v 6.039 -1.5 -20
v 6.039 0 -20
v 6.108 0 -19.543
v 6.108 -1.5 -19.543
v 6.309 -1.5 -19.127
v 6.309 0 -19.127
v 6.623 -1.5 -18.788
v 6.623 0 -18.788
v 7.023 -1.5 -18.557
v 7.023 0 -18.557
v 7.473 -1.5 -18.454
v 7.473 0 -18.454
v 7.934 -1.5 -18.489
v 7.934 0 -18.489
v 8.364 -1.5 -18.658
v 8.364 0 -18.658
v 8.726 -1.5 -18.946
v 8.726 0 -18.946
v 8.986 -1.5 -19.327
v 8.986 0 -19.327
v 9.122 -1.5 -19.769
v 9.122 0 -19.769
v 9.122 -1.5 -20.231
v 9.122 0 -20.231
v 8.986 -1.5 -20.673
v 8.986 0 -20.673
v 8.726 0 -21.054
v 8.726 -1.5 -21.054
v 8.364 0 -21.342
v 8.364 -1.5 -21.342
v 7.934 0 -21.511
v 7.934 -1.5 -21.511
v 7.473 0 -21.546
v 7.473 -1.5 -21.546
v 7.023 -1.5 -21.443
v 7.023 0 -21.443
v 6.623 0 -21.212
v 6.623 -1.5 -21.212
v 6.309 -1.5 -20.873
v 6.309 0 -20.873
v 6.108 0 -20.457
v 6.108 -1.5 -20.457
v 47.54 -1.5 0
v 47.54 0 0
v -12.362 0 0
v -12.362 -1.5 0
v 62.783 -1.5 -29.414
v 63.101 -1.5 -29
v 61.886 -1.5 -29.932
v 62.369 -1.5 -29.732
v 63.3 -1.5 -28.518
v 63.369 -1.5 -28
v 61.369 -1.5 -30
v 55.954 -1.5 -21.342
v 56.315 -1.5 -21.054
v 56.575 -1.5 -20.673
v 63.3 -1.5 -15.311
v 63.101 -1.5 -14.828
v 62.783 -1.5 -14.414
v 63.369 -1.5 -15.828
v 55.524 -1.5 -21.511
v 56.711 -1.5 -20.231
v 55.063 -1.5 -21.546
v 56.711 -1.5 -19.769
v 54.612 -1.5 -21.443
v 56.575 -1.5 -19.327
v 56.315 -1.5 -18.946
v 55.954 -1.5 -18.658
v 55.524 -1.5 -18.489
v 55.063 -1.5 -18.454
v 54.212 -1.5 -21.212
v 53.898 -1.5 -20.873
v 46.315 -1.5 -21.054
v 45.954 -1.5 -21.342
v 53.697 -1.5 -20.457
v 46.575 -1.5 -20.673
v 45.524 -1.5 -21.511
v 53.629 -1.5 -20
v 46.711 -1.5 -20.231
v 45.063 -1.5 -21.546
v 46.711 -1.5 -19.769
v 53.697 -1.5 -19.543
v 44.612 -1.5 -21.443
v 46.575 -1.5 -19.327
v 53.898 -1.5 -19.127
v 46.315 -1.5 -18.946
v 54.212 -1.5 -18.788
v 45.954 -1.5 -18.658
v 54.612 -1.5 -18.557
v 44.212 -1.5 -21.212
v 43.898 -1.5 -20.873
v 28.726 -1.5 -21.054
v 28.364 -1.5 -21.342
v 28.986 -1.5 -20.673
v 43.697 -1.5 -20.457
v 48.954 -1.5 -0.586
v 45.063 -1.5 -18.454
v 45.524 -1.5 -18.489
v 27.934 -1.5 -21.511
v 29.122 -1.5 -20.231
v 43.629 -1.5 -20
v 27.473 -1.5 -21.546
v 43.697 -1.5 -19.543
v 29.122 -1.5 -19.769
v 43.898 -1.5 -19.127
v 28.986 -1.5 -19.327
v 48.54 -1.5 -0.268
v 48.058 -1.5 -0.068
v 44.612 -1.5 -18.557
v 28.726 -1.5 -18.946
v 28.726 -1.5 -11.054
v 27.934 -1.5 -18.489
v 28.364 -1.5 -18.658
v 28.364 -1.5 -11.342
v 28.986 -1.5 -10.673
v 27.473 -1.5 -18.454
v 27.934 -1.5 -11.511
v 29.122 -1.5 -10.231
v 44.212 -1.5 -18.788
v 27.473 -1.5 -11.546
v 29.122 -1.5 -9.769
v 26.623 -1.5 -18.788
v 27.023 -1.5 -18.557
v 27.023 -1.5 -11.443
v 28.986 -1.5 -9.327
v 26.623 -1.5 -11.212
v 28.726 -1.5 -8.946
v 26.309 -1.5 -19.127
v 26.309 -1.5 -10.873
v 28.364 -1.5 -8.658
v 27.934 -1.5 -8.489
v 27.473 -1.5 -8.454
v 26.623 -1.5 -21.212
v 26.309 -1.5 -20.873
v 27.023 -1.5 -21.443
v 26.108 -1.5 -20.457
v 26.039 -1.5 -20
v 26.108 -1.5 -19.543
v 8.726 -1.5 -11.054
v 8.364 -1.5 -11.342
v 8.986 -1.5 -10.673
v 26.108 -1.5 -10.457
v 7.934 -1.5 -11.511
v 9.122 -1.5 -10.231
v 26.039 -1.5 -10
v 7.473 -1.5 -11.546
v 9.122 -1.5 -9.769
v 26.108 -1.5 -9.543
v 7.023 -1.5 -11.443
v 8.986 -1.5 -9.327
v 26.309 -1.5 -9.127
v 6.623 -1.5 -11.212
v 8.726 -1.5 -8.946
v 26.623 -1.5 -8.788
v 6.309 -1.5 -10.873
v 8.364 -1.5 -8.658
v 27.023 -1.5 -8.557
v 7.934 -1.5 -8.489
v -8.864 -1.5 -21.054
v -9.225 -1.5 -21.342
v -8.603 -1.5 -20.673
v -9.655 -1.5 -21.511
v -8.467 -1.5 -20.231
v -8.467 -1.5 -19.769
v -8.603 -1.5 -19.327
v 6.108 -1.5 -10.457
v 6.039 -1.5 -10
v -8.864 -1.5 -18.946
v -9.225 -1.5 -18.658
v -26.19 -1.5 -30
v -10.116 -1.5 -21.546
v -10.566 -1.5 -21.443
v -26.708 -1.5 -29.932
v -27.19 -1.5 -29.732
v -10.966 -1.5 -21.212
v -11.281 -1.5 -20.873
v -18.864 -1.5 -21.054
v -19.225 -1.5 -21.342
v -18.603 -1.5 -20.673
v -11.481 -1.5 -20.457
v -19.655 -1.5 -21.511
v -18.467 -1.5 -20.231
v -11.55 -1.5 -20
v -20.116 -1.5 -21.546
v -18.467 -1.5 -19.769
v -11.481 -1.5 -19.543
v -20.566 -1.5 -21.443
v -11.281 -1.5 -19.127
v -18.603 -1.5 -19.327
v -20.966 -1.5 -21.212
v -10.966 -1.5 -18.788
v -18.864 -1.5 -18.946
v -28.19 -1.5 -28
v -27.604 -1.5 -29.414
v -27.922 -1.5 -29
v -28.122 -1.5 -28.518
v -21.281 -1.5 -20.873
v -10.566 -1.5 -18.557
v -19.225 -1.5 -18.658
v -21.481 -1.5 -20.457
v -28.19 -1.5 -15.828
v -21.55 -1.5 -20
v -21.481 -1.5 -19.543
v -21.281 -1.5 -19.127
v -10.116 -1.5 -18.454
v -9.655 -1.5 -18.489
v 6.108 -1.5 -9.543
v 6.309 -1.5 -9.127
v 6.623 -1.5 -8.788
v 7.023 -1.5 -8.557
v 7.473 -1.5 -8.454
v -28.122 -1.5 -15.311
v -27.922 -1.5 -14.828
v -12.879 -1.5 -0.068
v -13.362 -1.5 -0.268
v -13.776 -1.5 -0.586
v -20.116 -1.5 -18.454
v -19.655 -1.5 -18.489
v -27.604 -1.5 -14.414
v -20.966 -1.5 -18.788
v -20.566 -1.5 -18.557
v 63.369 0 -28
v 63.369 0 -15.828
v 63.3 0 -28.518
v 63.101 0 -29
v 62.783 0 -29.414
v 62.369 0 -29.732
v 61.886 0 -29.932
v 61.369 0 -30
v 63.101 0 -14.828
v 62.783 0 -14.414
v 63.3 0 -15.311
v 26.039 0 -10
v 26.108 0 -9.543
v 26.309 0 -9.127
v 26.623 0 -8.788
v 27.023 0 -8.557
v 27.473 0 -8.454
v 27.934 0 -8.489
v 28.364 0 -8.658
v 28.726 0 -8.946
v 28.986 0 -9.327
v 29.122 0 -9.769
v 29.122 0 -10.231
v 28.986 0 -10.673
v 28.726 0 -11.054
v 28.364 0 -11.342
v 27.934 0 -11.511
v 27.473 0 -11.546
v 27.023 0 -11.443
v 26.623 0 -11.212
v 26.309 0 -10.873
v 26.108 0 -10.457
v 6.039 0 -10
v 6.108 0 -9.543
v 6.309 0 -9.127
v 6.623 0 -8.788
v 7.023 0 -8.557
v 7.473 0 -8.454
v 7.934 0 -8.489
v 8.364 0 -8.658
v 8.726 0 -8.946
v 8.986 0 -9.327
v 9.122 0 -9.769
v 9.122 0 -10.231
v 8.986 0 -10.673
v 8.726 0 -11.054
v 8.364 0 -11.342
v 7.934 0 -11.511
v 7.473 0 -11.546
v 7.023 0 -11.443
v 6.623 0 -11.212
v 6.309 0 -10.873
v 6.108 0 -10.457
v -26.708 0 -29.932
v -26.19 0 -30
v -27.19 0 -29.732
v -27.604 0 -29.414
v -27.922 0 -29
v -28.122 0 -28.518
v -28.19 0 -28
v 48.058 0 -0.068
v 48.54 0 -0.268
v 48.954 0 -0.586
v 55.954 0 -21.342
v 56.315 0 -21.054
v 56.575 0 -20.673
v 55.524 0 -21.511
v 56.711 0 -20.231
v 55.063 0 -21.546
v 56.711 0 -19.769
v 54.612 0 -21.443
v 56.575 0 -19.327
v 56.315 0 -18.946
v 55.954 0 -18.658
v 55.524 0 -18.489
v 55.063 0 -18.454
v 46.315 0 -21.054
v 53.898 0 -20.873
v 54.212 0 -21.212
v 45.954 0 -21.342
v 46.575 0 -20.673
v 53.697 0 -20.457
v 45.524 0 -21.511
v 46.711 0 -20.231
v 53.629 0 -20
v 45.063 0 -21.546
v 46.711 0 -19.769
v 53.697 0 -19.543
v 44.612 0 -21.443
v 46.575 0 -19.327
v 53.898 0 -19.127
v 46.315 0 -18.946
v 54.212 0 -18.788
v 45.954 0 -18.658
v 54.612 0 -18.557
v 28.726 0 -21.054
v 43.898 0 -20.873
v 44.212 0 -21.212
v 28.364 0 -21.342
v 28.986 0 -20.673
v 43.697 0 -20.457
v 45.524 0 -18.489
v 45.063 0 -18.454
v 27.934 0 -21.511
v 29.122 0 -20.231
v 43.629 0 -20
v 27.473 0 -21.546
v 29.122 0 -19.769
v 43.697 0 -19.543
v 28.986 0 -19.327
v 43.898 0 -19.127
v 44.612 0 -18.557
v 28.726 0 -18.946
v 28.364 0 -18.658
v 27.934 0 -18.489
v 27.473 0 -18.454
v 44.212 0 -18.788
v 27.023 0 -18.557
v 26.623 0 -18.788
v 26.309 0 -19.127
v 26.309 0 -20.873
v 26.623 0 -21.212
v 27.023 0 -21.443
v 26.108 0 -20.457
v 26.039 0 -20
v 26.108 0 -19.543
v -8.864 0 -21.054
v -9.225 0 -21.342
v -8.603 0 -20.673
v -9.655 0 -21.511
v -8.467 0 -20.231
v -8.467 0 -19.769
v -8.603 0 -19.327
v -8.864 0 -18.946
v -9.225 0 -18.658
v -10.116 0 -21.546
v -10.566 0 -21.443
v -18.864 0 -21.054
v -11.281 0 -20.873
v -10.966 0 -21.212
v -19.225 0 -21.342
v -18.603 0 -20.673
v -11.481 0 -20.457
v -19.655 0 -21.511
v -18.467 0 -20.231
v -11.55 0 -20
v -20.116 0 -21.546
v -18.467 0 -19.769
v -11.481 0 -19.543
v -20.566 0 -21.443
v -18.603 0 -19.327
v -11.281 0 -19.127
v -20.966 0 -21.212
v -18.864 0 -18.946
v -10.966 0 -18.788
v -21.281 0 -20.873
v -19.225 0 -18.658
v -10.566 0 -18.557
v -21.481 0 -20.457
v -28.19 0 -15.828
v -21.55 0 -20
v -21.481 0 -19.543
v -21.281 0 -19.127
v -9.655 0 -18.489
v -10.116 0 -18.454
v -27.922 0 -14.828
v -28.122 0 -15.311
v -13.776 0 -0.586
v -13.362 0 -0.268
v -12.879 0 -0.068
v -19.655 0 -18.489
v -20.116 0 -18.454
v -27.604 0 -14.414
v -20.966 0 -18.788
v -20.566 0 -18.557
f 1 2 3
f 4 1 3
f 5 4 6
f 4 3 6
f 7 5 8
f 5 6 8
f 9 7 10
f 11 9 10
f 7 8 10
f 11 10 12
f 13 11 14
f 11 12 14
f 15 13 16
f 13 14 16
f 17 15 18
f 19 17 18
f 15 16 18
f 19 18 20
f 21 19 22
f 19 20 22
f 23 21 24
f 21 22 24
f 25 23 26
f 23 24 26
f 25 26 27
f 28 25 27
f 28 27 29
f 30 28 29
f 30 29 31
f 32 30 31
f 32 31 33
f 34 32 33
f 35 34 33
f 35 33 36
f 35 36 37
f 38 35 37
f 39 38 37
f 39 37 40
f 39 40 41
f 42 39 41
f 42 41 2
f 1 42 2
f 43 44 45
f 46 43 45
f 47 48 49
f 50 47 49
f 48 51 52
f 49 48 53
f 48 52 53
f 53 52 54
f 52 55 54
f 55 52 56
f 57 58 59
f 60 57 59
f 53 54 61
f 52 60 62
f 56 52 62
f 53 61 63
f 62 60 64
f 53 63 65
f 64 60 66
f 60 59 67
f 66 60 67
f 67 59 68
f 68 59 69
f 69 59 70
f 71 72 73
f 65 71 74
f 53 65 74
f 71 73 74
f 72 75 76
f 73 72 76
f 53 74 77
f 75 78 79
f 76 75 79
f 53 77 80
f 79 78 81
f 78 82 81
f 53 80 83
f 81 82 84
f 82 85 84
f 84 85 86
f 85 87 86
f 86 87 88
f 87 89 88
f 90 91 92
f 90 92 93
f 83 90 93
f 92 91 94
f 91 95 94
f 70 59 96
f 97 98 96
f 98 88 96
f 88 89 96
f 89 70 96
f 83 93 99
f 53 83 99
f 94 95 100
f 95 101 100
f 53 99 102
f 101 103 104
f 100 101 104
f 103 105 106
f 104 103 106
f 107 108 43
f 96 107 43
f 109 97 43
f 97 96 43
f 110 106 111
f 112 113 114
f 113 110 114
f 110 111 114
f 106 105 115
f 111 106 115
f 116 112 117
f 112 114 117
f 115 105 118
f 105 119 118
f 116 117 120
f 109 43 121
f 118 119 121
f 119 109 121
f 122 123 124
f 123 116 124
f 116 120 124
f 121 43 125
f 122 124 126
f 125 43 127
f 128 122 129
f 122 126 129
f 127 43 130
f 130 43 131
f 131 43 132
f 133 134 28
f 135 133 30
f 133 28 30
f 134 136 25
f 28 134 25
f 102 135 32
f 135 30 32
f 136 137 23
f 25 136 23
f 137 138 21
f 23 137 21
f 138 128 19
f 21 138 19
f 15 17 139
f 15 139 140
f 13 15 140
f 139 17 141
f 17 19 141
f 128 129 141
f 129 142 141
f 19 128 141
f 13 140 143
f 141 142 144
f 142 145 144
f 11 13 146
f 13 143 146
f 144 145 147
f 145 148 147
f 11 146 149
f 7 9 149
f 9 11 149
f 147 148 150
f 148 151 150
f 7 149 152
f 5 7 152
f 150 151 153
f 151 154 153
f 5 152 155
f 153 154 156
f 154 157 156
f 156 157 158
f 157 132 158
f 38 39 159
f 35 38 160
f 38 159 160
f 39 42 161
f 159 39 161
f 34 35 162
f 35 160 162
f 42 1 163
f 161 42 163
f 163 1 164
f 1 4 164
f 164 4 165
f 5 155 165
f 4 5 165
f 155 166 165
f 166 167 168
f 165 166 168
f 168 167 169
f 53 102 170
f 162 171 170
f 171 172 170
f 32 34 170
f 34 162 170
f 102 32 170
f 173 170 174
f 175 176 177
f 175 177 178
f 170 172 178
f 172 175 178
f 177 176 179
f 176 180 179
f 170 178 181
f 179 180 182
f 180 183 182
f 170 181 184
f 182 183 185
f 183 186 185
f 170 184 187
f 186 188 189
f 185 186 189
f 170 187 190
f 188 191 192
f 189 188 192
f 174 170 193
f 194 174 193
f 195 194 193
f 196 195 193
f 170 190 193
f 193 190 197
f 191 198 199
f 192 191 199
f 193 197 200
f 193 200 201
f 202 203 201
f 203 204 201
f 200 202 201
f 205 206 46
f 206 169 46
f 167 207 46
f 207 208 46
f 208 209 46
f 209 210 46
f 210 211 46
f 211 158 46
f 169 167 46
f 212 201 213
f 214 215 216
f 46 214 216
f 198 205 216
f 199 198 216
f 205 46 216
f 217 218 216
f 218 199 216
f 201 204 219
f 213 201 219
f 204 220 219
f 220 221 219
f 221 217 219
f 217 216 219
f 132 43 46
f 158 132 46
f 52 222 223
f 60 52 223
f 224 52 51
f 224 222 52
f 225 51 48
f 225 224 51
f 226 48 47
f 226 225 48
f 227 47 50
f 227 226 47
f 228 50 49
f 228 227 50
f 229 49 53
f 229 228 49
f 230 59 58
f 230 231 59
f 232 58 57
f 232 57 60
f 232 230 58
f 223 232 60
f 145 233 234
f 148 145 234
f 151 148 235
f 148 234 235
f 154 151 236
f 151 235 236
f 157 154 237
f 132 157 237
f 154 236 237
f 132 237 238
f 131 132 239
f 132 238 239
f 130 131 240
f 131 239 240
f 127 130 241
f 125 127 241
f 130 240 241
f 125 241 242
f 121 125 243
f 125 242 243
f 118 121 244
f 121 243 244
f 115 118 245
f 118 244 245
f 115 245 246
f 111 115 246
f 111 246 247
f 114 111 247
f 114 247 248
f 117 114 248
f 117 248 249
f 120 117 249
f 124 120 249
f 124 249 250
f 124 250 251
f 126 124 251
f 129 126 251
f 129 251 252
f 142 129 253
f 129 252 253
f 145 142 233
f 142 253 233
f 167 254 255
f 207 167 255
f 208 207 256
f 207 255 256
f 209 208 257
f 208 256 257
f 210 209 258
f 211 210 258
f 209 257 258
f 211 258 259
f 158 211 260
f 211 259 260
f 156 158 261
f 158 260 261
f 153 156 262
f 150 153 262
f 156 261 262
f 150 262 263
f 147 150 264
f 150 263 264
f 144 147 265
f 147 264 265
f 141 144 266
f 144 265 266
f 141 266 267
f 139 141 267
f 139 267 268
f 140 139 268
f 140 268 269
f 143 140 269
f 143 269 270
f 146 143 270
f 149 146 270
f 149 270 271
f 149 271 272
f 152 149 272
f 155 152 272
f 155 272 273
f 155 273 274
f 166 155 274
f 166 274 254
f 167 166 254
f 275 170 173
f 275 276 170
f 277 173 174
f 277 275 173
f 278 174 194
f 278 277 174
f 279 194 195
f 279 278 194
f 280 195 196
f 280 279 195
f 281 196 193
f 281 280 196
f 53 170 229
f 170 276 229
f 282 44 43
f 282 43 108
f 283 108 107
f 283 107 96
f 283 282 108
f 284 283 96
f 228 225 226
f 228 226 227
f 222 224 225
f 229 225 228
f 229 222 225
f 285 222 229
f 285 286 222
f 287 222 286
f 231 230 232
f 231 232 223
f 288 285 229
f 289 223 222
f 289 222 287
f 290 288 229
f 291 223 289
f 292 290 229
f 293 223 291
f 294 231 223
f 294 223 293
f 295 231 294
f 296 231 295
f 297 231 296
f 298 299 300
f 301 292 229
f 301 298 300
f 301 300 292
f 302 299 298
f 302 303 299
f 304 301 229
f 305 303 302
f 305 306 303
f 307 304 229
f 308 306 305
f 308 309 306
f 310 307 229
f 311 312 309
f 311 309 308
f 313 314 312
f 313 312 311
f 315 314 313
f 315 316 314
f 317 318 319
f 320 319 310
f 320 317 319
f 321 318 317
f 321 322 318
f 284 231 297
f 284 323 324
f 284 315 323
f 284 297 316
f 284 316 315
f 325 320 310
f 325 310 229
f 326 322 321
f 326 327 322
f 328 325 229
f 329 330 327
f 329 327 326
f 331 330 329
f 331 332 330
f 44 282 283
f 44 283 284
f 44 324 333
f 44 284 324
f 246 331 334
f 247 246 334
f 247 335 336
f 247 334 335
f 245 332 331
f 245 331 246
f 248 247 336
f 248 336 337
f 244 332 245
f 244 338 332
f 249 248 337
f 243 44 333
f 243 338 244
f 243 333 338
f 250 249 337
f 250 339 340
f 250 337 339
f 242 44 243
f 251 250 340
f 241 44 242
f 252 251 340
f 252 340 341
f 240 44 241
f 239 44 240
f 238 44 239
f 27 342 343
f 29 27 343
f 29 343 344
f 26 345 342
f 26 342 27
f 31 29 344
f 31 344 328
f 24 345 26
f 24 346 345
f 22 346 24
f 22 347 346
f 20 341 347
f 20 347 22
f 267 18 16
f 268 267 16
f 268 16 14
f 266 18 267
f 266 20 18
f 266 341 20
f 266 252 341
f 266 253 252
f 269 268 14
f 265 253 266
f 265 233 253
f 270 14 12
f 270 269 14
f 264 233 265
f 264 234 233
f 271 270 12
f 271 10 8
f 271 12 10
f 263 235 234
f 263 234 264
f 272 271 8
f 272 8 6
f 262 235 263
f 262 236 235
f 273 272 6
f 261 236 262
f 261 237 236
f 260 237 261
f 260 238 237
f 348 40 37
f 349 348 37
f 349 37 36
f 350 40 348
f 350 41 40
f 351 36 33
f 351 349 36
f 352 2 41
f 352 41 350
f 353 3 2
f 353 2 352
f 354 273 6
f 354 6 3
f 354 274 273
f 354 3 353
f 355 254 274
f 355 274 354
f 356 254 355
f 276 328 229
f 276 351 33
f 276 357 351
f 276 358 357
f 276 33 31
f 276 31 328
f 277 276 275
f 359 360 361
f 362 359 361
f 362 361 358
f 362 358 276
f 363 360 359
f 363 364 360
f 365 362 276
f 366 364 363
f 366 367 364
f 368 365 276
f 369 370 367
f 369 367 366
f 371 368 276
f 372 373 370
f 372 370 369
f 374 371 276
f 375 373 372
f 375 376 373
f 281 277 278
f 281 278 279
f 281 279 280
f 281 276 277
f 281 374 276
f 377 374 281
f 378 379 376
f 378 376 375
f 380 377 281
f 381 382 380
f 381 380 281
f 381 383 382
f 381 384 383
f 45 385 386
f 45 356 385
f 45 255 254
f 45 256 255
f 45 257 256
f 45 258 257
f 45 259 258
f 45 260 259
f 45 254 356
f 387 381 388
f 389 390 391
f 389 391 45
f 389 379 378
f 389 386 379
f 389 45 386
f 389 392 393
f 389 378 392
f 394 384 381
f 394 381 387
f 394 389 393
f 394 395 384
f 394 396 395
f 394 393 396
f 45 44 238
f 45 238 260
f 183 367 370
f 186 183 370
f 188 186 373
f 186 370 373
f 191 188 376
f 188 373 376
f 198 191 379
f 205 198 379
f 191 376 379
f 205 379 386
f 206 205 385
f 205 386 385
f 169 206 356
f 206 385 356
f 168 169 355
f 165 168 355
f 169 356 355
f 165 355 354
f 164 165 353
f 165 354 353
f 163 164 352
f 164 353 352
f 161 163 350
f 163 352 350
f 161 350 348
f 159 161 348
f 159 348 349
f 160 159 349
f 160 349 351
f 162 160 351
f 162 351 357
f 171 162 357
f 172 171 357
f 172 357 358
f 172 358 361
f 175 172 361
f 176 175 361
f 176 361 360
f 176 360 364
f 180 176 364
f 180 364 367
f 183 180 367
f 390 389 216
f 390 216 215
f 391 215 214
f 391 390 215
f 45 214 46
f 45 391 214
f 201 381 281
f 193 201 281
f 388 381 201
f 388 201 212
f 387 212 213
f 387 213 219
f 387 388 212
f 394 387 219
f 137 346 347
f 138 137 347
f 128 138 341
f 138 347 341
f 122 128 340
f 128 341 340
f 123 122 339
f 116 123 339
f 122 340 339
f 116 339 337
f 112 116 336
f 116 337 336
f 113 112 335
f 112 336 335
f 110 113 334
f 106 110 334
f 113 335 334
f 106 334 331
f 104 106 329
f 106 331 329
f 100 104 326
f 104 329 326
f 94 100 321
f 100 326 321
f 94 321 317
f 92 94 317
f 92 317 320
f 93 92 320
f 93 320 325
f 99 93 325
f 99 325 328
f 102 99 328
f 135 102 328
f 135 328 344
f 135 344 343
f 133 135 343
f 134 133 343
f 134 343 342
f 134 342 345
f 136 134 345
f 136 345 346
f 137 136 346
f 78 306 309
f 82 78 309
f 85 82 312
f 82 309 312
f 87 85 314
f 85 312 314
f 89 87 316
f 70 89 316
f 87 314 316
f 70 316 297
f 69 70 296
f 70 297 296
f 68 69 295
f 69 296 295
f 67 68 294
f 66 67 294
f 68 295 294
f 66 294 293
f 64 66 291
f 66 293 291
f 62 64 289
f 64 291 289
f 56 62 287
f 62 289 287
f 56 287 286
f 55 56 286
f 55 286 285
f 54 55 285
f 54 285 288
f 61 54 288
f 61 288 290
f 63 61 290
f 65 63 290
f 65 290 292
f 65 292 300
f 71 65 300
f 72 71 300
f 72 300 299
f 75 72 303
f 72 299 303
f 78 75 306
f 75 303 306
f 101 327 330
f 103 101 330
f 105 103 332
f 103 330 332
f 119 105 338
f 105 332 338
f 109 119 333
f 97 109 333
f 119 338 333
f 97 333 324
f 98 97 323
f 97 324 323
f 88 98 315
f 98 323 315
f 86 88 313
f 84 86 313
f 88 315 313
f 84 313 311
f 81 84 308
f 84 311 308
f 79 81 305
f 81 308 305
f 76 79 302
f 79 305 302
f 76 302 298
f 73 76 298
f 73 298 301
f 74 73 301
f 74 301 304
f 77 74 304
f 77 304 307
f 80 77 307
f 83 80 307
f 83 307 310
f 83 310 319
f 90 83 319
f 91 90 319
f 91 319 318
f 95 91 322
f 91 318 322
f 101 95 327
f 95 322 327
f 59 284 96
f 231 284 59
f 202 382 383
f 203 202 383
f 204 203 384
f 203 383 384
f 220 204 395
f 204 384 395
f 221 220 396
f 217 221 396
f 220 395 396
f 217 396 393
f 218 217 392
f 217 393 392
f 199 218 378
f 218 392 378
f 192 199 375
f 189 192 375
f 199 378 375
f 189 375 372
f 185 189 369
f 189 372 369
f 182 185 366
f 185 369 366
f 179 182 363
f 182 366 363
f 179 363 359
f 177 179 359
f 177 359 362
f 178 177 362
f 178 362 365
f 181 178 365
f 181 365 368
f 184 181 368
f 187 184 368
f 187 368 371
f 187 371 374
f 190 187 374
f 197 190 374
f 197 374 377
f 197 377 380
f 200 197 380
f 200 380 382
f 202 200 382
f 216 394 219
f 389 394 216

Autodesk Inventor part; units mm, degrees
ref_plane "YZ Plane" through (0, 0, 0) normal (1, 0, 0) x (0, 1, 0)
ref_plane "XZ Plane" through (0, 0, 0) normal (0, 1, 0) x (-1, 0, 0)
ref_plane "XY Plane" through (0, 0, 0) normal (0, 0, 1) x (1, 0, 0)
sketch "Sketch1" plane through (0, 0, 0) normal (0, 1, 0) x (-1, 0, 0)
  line L0 (-0.4496, -30) -> (-0.4496, 0)
  line L1 (-34.7289, 0) -> (-34.7289, -30)
  circle A0 centre (-45.1786, -20) radius 1.55
  circle A1 centre (10, -20) radius 1.55
  circle A2 centre (-55.1786, -20) radius 1.55
  circle A3 centre (20, -20) radius 1.55
  circle A4 centre (-27.5893, -10) radius 1.55
  circle A5 centre (-27.5893, -20) radius 1.55
  circle A6 centre (-7.5893, -10) radius 1.55
  circle A7 centre (-7.5893, -20) radius 1.55
  arc A8 (13.7758, -0.5858) -> (12.3616, 0) centre (12.3616, -2) ccw
  line L2 (27.6042, -14.4142) -> (13.7758, -0.5858)
  arc A9 (28.19, -15.8284) -> (27.6042, -14.4142) centre (26.19, -15.8284) ccw
  line L3 (28.19, -15.8284) -> (28.19, -28)
  arc A10 (26.19, -30) -> (28.19, -28) centre (26.19, -28) ccw
  arc A11 (-47.5401, 0) -> (-48.9543, -0.5858) centre (-47.5401, -2) ccw
  line L4 (-48.9543, -0.5858) -> (-62.7828, -14.4142)
  arc A12 (-62.7828, -14.4142) -> (-63.3686, -15.8284) centre (-61.3686, -15.8284) ccw
  line L5 (-63.3686, -28) -> (-63.3686, -15.8284)
  arc A13 (-63.3686, -28) -> (-61.3686, -30) centre (-61.3686, -28) ccw
  line L6 (-47.5401, 0) -> (12.3616, 0)
  line L7 (26.19, -30) -> (-61.3686, -30)
  line L8 (-35.1786, -30) -> (-35.1786, 0)
  line L9 (-34.2793, 0) -> (-34.2793, -30)
  line L10 (-0.8993, -30) -> (-0.8993, 0)
  line L11 (0, 0) -> (0, -30)
extrude "Extrusion1" add sketch "Sketch1" against normal blind 1.5
properties part number "Head1"
